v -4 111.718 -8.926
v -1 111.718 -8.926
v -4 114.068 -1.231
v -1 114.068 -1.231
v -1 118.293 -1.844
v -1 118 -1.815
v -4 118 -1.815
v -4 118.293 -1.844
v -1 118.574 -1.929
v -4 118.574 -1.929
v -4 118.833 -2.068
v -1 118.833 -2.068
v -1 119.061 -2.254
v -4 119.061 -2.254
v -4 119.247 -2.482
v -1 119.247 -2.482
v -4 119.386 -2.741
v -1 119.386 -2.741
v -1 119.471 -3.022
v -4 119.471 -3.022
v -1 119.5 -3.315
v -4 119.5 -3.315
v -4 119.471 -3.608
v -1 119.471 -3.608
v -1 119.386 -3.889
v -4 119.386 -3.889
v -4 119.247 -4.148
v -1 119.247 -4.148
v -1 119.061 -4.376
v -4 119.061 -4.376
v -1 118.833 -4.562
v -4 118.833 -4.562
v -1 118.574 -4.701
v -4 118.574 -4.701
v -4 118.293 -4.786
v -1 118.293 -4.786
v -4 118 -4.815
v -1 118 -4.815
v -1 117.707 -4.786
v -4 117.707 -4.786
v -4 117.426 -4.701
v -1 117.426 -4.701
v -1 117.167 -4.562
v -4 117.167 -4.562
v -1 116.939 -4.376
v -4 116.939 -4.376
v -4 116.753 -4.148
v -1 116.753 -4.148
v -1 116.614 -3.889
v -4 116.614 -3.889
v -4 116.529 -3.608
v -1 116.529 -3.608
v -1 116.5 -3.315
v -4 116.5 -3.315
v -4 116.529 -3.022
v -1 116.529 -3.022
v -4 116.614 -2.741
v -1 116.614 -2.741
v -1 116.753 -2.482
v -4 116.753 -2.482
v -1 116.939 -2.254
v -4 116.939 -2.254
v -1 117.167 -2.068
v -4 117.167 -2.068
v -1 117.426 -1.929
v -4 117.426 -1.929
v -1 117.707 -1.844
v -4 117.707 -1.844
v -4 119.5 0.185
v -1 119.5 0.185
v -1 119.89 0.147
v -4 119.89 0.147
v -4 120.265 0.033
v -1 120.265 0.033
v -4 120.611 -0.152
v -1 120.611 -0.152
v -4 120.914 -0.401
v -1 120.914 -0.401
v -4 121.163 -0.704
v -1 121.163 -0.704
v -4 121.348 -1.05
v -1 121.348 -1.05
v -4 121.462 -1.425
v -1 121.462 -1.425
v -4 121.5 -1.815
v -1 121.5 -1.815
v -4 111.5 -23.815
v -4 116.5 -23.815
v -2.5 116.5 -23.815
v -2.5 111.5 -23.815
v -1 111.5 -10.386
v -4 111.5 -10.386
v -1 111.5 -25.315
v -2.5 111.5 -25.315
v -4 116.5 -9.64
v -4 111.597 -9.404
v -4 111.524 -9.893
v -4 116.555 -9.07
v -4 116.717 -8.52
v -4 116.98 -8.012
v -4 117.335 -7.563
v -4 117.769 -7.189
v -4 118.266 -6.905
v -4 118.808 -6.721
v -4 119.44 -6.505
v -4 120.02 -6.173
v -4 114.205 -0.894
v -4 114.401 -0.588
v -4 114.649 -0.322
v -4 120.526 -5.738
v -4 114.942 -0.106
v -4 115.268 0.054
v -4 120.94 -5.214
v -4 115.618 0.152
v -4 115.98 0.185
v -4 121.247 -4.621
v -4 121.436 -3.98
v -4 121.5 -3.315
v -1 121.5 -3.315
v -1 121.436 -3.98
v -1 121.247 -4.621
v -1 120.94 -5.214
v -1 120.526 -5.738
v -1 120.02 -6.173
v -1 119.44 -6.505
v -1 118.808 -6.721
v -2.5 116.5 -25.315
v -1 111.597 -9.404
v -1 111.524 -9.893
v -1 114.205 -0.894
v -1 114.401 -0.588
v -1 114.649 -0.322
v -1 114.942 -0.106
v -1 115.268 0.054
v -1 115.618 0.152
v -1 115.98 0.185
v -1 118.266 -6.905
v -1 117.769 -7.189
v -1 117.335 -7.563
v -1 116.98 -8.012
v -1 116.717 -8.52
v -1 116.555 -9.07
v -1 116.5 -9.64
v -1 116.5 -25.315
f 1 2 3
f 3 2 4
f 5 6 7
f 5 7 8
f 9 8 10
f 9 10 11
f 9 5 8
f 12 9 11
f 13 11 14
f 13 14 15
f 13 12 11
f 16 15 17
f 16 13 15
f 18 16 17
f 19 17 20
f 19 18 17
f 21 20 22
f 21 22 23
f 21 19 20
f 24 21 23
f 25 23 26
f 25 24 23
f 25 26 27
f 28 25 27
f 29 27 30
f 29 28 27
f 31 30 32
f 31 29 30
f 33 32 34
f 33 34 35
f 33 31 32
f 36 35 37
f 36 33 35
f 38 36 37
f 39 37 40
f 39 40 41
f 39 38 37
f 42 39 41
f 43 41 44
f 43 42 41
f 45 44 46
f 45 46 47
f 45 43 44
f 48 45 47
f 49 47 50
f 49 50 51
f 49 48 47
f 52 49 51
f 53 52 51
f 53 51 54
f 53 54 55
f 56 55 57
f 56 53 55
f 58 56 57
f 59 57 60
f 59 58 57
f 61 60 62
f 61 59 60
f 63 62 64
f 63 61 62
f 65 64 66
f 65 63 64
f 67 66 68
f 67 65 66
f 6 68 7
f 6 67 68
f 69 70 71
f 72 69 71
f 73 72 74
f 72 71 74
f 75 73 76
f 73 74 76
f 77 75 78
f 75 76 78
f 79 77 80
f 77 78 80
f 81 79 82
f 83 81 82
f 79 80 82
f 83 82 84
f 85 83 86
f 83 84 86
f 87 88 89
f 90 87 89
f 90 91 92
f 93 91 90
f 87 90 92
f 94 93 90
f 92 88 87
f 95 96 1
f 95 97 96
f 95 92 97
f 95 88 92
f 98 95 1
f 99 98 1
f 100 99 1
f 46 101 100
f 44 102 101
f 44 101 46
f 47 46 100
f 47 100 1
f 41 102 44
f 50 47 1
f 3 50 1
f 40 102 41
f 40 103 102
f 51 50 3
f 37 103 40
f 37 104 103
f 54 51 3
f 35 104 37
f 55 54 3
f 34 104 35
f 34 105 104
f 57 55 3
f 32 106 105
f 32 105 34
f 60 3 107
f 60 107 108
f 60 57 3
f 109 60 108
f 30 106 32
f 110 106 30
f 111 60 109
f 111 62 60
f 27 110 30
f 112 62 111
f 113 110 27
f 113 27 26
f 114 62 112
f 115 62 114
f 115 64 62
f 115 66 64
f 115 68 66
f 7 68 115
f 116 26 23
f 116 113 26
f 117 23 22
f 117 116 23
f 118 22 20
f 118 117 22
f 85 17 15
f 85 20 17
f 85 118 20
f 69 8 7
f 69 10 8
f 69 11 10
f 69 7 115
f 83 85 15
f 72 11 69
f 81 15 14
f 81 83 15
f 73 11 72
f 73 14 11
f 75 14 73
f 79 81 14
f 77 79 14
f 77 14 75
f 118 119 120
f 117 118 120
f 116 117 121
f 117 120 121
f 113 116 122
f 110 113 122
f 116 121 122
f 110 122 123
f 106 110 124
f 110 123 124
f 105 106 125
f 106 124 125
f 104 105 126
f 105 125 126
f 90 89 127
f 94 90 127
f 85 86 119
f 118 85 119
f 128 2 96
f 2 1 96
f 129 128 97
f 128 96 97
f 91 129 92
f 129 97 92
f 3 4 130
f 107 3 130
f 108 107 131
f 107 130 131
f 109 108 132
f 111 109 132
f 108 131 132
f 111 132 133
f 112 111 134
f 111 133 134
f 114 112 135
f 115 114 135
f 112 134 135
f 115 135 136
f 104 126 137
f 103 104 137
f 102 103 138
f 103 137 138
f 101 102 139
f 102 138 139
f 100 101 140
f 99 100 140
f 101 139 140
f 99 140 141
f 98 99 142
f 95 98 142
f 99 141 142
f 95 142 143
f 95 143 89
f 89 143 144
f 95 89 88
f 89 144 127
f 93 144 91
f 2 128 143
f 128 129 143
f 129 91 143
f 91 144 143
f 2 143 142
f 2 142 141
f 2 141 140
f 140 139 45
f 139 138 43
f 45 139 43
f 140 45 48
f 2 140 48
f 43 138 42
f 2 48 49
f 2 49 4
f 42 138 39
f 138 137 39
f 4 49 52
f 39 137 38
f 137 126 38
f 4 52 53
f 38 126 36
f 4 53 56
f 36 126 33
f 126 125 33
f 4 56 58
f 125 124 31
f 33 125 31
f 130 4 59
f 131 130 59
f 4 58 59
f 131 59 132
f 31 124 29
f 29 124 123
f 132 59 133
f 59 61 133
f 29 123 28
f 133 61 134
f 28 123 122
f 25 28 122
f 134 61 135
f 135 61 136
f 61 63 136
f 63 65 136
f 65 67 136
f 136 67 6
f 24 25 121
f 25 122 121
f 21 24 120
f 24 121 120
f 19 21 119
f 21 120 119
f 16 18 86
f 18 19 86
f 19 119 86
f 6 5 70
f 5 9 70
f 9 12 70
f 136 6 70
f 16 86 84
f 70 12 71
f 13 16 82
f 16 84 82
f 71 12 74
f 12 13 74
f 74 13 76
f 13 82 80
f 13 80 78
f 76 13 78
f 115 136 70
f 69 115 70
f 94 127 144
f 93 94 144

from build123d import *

# Parameters (mm, degrees)
TAB_EXTRUDE_DEPTH       = 5
SKETCH2_R               = 1.5
SCREWHOLE_EXTRUDE_DEPTH = 3
STRUCTURAL_FILLETS_R    = 5


with BuildPart() as part:
    # Sketch1 → Tab extrude (new body)
    with BuildSketch(Plane(origin=(0, 116.5, 0), x_dir=(1, 0, 0), z_dir=(0, 1, 0))):
        Polygon((-4, 23.815), (-2.5, 23.815), (-2.5, 25.315), (-1, 25.315), (-1, 9.63955532), (-4, 9.63955532), align=None)
    extrude(amount=-TAB_EXTRUDE_DEPTH)

    # Sketch2 → Screwhole extrude (add)
    with BuildSketch(Plane.ZY.offset(1)):
        with BuildLine():
            Line((-9.63955532, 111.5), (-1.230909725, 114.067641584))
            ThreePointArc((-1.230909725, 114.067641584), (-0.207489417, 114.790530608), (0.185, 115.980450657))
            Line((0.185, 115.980450657), (0.185, 119.5))
            ThreePointArc((0.185, 119.5), (-0.400786438, 120.914213562), (-1.815, 121.5))
            Line((-1.815, 121.5), (-3.315, 121.5))
            ThreePointArc((-3.315, 121.5), (-5.485607855, 120.745625892), (-6.720529788, 118.807692308))
            ThreePointArc((-6.720529788, 118.807692308), (-7.779034301, 117.146606378), (-9.63955532, 116.5))
            Line((-9.63955532, 116.5), (-9.63955532, 111.5))
        make_face()
        with Locations((-3.315, 118)):
            Circle(SKETCH2_R, mode=Mode.SUBTRACT)
    extrude(amount=SCREWHOLE_EXTRUDE_DEPTH)

    # Structural fillets
    structural_fillets_edges = [part.edges().sort_by_distance(p)[0] for p in [
        (-2.5, 111.5, -9.63955532),
    ]]
    fillet(structural_fillets_edges, radius=STRUCTURAL_FILLETS_R)


solid = part.part
